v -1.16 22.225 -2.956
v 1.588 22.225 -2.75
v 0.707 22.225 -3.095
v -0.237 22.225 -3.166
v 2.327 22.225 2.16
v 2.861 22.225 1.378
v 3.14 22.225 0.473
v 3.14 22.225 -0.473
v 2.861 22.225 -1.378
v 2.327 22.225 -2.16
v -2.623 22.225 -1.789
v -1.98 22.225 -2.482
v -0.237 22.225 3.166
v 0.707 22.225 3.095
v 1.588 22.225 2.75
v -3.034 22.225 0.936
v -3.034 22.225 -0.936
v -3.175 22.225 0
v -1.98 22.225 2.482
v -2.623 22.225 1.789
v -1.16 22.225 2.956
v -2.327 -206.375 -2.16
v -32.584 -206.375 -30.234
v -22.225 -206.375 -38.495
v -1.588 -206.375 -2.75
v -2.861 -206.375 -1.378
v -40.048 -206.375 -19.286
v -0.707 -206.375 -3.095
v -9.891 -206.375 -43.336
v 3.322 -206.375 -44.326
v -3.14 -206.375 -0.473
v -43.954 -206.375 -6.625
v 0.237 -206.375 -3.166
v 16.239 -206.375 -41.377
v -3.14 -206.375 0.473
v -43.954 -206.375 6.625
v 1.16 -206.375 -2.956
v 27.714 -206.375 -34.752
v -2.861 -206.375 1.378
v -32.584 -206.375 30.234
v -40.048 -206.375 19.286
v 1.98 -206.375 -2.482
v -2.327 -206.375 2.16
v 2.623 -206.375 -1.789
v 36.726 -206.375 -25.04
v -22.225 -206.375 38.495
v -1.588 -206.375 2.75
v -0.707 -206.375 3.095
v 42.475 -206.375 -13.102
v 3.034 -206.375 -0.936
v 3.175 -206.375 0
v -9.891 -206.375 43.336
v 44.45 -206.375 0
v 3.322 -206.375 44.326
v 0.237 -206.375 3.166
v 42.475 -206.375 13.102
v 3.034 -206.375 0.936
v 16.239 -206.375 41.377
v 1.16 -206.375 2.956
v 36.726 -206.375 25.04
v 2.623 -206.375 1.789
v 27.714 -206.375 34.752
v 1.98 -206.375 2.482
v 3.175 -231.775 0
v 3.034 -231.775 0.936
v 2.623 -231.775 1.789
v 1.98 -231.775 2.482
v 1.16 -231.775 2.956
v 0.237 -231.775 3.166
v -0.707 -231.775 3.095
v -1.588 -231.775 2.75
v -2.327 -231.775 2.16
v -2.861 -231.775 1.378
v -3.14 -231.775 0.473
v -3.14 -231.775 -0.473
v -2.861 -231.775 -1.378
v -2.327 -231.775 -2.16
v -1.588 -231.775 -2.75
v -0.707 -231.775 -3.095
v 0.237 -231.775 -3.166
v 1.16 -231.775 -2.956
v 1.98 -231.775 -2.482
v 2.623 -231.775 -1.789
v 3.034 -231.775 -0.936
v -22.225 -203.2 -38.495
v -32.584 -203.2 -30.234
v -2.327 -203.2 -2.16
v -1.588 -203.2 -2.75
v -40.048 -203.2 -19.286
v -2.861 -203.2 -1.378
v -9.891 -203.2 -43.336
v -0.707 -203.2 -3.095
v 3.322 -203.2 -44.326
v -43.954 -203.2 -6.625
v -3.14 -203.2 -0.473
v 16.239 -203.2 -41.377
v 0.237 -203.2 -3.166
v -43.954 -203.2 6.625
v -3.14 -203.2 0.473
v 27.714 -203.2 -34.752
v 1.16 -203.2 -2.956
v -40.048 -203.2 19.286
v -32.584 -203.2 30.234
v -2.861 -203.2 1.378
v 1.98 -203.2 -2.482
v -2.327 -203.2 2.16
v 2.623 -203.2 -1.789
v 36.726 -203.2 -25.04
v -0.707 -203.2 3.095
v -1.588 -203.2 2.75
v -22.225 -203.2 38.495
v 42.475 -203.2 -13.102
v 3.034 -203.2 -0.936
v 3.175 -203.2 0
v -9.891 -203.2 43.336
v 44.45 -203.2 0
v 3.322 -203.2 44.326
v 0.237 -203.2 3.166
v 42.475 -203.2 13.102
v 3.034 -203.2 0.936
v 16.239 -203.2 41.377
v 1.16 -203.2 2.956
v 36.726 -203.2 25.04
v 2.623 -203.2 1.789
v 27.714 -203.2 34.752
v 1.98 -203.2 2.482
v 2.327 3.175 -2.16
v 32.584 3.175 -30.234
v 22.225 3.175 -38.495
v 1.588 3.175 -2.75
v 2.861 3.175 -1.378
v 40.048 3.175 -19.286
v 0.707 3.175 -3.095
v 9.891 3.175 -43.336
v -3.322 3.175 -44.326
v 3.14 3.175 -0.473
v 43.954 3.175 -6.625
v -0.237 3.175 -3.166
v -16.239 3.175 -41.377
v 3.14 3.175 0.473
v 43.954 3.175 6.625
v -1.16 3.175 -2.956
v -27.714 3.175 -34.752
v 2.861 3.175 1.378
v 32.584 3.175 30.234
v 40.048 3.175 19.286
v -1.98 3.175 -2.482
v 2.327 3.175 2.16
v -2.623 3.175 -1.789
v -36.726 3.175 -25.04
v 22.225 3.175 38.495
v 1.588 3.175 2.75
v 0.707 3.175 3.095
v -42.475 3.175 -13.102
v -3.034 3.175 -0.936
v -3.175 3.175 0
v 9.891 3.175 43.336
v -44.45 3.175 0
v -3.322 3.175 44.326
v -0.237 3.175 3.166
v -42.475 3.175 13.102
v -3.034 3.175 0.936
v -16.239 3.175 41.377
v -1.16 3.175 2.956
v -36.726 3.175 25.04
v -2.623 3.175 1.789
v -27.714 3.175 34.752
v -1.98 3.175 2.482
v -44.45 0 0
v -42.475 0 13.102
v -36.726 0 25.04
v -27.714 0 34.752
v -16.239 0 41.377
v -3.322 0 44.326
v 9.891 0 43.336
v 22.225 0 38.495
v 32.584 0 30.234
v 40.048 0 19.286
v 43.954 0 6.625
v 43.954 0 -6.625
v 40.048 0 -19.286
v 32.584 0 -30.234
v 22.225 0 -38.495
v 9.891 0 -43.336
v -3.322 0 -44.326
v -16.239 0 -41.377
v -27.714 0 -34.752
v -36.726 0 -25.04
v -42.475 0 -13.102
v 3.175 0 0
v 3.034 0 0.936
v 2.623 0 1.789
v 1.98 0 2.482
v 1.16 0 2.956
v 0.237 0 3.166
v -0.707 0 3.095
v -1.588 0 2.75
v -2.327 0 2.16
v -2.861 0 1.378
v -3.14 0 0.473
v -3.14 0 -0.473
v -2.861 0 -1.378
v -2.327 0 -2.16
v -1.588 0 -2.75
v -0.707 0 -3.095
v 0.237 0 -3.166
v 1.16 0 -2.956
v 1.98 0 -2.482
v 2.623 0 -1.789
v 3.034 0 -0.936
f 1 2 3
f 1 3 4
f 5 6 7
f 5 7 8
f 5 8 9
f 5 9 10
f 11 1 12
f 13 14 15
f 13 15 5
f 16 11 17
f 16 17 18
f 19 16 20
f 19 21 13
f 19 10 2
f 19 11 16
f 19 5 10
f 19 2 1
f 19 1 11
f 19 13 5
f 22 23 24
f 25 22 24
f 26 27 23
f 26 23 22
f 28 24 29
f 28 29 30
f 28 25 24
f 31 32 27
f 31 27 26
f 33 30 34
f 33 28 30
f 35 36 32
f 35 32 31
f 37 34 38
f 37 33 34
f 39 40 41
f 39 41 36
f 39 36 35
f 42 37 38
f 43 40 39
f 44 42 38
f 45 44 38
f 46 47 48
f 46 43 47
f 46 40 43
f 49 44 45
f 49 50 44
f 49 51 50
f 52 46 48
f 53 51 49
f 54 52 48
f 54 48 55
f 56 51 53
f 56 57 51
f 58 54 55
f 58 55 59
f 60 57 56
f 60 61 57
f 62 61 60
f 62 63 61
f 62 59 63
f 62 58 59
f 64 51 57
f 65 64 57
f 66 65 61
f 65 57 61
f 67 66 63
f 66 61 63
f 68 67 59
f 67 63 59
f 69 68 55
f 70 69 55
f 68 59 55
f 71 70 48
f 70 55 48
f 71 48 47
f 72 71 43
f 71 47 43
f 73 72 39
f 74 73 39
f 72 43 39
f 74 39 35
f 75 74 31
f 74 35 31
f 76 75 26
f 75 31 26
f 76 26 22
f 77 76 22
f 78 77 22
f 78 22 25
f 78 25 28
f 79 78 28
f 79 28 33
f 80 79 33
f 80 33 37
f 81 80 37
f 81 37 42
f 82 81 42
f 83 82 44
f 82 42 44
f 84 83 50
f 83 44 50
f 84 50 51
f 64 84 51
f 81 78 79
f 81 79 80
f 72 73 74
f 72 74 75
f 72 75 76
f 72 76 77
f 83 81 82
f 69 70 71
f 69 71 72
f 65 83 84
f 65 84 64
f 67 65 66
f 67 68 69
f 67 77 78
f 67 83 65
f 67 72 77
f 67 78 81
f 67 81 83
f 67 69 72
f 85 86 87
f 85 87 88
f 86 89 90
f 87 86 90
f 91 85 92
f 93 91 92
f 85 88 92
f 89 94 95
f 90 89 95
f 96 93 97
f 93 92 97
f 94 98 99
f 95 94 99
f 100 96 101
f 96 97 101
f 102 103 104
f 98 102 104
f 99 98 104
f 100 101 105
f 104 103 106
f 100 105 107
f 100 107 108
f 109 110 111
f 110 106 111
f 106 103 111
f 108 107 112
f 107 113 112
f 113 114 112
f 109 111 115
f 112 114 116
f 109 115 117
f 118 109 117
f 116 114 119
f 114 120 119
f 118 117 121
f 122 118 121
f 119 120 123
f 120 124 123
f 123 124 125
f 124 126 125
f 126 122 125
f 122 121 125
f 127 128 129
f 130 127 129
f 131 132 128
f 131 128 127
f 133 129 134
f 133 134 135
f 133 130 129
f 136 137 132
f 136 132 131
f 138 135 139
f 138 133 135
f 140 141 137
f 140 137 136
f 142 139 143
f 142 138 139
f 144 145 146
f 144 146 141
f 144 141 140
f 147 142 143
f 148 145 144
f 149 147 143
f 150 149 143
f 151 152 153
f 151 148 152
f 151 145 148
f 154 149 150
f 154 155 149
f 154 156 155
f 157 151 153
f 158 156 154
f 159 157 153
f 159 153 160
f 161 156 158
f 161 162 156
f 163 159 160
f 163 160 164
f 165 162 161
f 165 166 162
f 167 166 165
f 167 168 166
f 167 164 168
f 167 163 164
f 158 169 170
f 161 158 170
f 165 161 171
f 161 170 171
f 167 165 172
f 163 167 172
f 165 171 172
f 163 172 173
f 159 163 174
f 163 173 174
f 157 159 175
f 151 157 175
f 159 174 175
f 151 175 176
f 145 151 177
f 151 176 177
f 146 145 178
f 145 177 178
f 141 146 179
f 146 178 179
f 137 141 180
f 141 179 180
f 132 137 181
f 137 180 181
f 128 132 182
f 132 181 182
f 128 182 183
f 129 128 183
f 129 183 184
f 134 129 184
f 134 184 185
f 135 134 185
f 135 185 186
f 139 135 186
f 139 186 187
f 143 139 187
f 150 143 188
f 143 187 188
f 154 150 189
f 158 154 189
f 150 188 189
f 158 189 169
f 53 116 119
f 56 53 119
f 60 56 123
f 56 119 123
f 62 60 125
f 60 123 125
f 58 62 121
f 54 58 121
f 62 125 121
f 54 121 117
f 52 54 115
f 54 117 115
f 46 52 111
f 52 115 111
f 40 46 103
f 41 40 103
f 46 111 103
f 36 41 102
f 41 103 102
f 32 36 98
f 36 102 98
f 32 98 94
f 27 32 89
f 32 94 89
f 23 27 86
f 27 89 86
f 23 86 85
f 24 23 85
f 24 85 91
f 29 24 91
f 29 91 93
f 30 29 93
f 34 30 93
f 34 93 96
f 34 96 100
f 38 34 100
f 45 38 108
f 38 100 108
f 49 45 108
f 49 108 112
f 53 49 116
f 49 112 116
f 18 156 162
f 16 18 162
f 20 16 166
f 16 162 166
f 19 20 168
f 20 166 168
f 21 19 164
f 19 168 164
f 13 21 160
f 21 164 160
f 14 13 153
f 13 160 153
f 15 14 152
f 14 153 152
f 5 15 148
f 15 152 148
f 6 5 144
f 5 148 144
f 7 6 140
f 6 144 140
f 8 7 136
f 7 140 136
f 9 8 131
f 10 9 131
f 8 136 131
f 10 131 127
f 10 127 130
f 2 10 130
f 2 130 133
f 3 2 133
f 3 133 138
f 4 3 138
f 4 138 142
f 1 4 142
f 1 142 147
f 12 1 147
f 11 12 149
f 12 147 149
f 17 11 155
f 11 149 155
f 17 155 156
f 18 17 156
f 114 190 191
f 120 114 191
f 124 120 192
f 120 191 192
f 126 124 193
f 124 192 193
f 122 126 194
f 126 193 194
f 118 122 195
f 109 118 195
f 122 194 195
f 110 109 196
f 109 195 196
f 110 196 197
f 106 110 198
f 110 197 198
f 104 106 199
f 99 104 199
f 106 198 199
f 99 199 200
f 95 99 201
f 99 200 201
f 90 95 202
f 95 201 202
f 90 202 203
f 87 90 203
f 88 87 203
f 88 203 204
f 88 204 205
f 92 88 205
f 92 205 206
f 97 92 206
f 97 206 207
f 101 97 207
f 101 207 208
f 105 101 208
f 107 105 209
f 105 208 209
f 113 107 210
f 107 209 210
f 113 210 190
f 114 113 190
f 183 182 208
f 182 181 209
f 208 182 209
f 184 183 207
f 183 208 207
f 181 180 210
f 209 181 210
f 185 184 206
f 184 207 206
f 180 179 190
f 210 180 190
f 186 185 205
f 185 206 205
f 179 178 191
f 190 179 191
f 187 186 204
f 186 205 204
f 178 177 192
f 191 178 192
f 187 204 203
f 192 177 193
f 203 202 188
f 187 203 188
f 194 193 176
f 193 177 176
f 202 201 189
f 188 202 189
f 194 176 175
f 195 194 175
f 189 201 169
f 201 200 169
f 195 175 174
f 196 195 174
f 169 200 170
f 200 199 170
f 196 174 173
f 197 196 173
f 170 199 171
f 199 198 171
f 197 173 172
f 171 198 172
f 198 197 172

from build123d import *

# Parameters (mm, degrees)
F0_R     = 3.175
F1_DEPTH = 203.2
F2_R     = 44.45
F3_DEPTH = 3.175
F4_R     = 44.45
F5_DEPTH = 3.175
F6_R     = 3.175
F7_DEPTH = 25.4
F8_R     = 3.175
F9_DEPTH = 19.05


with BuildPart() as f1:
    # F0 (on Front) → F1 (new body)
    with BuildSketch(Plane.XZ):
        Circle(F0_R)
    extrude(amount=F1_DEPTH)

    # F2 (on face) → F3 (join)
    with BuildSketch(Plane.XZ.offset(203.2)):
        Circle(F2_R)
    extrude(amount=F3_DEPTH)

    # F4 (on face) → F5 (join)
    with BuildSketch(Plane(origin=(0, 0, 0), x_dir=(-1, 0, 0), z_dir=(0, 1, 0))):
        Circle(F4_R)
    extrude(amount=F5_DEPTH)

    # F6 (on face) → F7 (join)
    with BuildSketch(Plane.XZ.offset(206.375)):
        Circle(F6_R)
    extrude(amount=F7_DEPTH)

    # F8 (on face) → F9 (join)
    with BuildSketch(Plane(origin=(0, 3.175, 0), x_dir=(-1, 0, 0), z_dir=(0, 1, 0))):
        Circle(F8_R)
    extrude(amount=F9_DEPTH)


solid = f1.part
